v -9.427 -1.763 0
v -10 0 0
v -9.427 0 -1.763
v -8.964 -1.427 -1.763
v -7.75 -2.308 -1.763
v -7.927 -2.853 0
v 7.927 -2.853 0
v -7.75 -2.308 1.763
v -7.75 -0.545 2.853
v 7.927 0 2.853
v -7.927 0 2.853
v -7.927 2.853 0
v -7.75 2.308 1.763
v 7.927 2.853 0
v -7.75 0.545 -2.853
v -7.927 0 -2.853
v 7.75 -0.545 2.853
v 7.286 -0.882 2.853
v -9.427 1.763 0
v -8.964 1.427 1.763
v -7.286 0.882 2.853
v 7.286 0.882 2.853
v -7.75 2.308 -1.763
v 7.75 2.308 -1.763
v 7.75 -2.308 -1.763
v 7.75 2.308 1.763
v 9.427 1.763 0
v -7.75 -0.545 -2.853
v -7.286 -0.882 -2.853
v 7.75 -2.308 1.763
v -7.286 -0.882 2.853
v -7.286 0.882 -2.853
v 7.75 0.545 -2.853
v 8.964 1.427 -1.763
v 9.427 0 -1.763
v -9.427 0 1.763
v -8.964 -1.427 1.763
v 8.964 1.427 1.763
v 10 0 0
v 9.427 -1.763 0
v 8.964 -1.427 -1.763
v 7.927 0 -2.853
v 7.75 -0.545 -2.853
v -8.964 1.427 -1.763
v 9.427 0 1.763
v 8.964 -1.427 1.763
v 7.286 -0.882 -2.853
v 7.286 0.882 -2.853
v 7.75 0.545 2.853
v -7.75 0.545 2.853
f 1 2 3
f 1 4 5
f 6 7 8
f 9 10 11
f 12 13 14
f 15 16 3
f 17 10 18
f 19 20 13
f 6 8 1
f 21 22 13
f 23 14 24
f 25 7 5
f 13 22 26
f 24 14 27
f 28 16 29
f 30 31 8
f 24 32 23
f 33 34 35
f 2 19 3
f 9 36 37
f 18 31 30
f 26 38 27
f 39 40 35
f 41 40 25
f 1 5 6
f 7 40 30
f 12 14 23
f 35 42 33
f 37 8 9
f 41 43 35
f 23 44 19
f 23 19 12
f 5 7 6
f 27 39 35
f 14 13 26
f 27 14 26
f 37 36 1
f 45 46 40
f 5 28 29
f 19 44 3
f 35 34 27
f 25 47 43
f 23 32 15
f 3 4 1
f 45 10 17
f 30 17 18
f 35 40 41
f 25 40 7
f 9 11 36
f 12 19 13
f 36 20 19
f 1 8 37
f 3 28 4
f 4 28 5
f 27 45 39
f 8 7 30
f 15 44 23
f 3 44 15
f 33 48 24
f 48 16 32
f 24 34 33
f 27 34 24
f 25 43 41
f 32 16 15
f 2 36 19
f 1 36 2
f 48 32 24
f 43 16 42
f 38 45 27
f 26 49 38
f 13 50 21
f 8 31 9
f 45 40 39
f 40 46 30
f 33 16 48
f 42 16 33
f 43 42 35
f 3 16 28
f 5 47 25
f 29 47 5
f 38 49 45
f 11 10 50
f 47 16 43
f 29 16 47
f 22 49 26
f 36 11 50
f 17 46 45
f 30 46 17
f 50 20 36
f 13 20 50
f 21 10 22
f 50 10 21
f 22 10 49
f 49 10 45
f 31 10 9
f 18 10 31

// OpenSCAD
// Rung 2: hull() of 2 (collinear) equal-radius spheres -> exact capsule.
hull() {
    translate([-7,0,0]) sphere(r=3);
    translate([7,0,0]) sphere(r=3);
}
